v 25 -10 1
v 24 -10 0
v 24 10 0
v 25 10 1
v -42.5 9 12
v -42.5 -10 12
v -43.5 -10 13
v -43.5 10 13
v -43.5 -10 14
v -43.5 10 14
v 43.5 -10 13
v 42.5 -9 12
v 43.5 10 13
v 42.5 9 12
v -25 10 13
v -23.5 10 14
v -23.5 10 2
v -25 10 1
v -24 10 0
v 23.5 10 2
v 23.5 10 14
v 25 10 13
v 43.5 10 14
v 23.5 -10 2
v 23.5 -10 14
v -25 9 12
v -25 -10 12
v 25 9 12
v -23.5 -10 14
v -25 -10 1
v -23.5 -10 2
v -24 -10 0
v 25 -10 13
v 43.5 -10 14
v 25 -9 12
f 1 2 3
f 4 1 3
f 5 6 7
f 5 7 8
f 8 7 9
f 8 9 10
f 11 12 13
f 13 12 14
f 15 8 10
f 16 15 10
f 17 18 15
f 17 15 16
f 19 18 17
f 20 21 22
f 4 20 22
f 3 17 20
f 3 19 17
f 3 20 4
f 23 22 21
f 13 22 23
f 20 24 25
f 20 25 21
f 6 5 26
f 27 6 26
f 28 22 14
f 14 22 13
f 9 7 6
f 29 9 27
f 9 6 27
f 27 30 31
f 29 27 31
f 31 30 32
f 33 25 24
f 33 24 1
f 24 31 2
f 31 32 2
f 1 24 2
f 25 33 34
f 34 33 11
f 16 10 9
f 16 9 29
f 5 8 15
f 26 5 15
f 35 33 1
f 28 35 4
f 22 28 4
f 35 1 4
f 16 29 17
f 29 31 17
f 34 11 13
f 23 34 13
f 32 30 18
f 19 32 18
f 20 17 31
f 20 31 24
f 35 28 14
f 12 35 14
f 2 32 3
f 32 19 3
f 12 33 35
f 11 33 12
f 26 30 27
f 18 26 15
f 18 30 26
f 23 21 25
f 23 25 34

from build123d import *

# Parameters (mm, degrees)
F0_W     = 50
F0_H     = 20
F1_DEPTH = 2
F2_W     = 1.5
F2_H     = 20
F3_DEPTH = 10
F4_W     = 20
F4_H     = 20
F5_DEPTH = 2
F6_SIZE  = 1


with BuildPart() as f1:
    # F0 (on Top) → F1 (new body)
    with BuildSketch(Plane.XY):
        Rectangle(F0_W, F0_H)
    extrude(amount=F1_DEPTH)

    # F2 (on face) → F3 (join)
    with BuildSketch(Plane.XY.offset(2)):
        with Locations((-24.25, 0)):
            Rectangle(F2_W, F2_H)
        with Locations((24.25, 0)):
            Rectangle(F2_W, F2_H)
    extrude(amount=F3_DEPTH)

    # F4 (on face) → F5 (join)
    with BuildSketch(Plane.XY.offset(12)):
        with Locations((-33.5, 0)):
            Rectangle(F4_W, F4_H)
        with Locations((33.5, 0)):
            Rectangle(F4_W, F4_H)
    extrude(amount=F5_DEPTH)

    # F6
    f6_edges = [f1.edges().sort_by_distance(p)[0] for p in [
        (-25, 0, 0),
        (25, 0, 0),
        (-43.5, 0, 12),
        (43.5, 0, 12),
        (34.25, -10, 12),
        (34.25, 10, 12),
        (-34.25, 10, 12),
    ]]
    chamfer(f6_edges, length=F6_SIZE)


solid = f1.part
